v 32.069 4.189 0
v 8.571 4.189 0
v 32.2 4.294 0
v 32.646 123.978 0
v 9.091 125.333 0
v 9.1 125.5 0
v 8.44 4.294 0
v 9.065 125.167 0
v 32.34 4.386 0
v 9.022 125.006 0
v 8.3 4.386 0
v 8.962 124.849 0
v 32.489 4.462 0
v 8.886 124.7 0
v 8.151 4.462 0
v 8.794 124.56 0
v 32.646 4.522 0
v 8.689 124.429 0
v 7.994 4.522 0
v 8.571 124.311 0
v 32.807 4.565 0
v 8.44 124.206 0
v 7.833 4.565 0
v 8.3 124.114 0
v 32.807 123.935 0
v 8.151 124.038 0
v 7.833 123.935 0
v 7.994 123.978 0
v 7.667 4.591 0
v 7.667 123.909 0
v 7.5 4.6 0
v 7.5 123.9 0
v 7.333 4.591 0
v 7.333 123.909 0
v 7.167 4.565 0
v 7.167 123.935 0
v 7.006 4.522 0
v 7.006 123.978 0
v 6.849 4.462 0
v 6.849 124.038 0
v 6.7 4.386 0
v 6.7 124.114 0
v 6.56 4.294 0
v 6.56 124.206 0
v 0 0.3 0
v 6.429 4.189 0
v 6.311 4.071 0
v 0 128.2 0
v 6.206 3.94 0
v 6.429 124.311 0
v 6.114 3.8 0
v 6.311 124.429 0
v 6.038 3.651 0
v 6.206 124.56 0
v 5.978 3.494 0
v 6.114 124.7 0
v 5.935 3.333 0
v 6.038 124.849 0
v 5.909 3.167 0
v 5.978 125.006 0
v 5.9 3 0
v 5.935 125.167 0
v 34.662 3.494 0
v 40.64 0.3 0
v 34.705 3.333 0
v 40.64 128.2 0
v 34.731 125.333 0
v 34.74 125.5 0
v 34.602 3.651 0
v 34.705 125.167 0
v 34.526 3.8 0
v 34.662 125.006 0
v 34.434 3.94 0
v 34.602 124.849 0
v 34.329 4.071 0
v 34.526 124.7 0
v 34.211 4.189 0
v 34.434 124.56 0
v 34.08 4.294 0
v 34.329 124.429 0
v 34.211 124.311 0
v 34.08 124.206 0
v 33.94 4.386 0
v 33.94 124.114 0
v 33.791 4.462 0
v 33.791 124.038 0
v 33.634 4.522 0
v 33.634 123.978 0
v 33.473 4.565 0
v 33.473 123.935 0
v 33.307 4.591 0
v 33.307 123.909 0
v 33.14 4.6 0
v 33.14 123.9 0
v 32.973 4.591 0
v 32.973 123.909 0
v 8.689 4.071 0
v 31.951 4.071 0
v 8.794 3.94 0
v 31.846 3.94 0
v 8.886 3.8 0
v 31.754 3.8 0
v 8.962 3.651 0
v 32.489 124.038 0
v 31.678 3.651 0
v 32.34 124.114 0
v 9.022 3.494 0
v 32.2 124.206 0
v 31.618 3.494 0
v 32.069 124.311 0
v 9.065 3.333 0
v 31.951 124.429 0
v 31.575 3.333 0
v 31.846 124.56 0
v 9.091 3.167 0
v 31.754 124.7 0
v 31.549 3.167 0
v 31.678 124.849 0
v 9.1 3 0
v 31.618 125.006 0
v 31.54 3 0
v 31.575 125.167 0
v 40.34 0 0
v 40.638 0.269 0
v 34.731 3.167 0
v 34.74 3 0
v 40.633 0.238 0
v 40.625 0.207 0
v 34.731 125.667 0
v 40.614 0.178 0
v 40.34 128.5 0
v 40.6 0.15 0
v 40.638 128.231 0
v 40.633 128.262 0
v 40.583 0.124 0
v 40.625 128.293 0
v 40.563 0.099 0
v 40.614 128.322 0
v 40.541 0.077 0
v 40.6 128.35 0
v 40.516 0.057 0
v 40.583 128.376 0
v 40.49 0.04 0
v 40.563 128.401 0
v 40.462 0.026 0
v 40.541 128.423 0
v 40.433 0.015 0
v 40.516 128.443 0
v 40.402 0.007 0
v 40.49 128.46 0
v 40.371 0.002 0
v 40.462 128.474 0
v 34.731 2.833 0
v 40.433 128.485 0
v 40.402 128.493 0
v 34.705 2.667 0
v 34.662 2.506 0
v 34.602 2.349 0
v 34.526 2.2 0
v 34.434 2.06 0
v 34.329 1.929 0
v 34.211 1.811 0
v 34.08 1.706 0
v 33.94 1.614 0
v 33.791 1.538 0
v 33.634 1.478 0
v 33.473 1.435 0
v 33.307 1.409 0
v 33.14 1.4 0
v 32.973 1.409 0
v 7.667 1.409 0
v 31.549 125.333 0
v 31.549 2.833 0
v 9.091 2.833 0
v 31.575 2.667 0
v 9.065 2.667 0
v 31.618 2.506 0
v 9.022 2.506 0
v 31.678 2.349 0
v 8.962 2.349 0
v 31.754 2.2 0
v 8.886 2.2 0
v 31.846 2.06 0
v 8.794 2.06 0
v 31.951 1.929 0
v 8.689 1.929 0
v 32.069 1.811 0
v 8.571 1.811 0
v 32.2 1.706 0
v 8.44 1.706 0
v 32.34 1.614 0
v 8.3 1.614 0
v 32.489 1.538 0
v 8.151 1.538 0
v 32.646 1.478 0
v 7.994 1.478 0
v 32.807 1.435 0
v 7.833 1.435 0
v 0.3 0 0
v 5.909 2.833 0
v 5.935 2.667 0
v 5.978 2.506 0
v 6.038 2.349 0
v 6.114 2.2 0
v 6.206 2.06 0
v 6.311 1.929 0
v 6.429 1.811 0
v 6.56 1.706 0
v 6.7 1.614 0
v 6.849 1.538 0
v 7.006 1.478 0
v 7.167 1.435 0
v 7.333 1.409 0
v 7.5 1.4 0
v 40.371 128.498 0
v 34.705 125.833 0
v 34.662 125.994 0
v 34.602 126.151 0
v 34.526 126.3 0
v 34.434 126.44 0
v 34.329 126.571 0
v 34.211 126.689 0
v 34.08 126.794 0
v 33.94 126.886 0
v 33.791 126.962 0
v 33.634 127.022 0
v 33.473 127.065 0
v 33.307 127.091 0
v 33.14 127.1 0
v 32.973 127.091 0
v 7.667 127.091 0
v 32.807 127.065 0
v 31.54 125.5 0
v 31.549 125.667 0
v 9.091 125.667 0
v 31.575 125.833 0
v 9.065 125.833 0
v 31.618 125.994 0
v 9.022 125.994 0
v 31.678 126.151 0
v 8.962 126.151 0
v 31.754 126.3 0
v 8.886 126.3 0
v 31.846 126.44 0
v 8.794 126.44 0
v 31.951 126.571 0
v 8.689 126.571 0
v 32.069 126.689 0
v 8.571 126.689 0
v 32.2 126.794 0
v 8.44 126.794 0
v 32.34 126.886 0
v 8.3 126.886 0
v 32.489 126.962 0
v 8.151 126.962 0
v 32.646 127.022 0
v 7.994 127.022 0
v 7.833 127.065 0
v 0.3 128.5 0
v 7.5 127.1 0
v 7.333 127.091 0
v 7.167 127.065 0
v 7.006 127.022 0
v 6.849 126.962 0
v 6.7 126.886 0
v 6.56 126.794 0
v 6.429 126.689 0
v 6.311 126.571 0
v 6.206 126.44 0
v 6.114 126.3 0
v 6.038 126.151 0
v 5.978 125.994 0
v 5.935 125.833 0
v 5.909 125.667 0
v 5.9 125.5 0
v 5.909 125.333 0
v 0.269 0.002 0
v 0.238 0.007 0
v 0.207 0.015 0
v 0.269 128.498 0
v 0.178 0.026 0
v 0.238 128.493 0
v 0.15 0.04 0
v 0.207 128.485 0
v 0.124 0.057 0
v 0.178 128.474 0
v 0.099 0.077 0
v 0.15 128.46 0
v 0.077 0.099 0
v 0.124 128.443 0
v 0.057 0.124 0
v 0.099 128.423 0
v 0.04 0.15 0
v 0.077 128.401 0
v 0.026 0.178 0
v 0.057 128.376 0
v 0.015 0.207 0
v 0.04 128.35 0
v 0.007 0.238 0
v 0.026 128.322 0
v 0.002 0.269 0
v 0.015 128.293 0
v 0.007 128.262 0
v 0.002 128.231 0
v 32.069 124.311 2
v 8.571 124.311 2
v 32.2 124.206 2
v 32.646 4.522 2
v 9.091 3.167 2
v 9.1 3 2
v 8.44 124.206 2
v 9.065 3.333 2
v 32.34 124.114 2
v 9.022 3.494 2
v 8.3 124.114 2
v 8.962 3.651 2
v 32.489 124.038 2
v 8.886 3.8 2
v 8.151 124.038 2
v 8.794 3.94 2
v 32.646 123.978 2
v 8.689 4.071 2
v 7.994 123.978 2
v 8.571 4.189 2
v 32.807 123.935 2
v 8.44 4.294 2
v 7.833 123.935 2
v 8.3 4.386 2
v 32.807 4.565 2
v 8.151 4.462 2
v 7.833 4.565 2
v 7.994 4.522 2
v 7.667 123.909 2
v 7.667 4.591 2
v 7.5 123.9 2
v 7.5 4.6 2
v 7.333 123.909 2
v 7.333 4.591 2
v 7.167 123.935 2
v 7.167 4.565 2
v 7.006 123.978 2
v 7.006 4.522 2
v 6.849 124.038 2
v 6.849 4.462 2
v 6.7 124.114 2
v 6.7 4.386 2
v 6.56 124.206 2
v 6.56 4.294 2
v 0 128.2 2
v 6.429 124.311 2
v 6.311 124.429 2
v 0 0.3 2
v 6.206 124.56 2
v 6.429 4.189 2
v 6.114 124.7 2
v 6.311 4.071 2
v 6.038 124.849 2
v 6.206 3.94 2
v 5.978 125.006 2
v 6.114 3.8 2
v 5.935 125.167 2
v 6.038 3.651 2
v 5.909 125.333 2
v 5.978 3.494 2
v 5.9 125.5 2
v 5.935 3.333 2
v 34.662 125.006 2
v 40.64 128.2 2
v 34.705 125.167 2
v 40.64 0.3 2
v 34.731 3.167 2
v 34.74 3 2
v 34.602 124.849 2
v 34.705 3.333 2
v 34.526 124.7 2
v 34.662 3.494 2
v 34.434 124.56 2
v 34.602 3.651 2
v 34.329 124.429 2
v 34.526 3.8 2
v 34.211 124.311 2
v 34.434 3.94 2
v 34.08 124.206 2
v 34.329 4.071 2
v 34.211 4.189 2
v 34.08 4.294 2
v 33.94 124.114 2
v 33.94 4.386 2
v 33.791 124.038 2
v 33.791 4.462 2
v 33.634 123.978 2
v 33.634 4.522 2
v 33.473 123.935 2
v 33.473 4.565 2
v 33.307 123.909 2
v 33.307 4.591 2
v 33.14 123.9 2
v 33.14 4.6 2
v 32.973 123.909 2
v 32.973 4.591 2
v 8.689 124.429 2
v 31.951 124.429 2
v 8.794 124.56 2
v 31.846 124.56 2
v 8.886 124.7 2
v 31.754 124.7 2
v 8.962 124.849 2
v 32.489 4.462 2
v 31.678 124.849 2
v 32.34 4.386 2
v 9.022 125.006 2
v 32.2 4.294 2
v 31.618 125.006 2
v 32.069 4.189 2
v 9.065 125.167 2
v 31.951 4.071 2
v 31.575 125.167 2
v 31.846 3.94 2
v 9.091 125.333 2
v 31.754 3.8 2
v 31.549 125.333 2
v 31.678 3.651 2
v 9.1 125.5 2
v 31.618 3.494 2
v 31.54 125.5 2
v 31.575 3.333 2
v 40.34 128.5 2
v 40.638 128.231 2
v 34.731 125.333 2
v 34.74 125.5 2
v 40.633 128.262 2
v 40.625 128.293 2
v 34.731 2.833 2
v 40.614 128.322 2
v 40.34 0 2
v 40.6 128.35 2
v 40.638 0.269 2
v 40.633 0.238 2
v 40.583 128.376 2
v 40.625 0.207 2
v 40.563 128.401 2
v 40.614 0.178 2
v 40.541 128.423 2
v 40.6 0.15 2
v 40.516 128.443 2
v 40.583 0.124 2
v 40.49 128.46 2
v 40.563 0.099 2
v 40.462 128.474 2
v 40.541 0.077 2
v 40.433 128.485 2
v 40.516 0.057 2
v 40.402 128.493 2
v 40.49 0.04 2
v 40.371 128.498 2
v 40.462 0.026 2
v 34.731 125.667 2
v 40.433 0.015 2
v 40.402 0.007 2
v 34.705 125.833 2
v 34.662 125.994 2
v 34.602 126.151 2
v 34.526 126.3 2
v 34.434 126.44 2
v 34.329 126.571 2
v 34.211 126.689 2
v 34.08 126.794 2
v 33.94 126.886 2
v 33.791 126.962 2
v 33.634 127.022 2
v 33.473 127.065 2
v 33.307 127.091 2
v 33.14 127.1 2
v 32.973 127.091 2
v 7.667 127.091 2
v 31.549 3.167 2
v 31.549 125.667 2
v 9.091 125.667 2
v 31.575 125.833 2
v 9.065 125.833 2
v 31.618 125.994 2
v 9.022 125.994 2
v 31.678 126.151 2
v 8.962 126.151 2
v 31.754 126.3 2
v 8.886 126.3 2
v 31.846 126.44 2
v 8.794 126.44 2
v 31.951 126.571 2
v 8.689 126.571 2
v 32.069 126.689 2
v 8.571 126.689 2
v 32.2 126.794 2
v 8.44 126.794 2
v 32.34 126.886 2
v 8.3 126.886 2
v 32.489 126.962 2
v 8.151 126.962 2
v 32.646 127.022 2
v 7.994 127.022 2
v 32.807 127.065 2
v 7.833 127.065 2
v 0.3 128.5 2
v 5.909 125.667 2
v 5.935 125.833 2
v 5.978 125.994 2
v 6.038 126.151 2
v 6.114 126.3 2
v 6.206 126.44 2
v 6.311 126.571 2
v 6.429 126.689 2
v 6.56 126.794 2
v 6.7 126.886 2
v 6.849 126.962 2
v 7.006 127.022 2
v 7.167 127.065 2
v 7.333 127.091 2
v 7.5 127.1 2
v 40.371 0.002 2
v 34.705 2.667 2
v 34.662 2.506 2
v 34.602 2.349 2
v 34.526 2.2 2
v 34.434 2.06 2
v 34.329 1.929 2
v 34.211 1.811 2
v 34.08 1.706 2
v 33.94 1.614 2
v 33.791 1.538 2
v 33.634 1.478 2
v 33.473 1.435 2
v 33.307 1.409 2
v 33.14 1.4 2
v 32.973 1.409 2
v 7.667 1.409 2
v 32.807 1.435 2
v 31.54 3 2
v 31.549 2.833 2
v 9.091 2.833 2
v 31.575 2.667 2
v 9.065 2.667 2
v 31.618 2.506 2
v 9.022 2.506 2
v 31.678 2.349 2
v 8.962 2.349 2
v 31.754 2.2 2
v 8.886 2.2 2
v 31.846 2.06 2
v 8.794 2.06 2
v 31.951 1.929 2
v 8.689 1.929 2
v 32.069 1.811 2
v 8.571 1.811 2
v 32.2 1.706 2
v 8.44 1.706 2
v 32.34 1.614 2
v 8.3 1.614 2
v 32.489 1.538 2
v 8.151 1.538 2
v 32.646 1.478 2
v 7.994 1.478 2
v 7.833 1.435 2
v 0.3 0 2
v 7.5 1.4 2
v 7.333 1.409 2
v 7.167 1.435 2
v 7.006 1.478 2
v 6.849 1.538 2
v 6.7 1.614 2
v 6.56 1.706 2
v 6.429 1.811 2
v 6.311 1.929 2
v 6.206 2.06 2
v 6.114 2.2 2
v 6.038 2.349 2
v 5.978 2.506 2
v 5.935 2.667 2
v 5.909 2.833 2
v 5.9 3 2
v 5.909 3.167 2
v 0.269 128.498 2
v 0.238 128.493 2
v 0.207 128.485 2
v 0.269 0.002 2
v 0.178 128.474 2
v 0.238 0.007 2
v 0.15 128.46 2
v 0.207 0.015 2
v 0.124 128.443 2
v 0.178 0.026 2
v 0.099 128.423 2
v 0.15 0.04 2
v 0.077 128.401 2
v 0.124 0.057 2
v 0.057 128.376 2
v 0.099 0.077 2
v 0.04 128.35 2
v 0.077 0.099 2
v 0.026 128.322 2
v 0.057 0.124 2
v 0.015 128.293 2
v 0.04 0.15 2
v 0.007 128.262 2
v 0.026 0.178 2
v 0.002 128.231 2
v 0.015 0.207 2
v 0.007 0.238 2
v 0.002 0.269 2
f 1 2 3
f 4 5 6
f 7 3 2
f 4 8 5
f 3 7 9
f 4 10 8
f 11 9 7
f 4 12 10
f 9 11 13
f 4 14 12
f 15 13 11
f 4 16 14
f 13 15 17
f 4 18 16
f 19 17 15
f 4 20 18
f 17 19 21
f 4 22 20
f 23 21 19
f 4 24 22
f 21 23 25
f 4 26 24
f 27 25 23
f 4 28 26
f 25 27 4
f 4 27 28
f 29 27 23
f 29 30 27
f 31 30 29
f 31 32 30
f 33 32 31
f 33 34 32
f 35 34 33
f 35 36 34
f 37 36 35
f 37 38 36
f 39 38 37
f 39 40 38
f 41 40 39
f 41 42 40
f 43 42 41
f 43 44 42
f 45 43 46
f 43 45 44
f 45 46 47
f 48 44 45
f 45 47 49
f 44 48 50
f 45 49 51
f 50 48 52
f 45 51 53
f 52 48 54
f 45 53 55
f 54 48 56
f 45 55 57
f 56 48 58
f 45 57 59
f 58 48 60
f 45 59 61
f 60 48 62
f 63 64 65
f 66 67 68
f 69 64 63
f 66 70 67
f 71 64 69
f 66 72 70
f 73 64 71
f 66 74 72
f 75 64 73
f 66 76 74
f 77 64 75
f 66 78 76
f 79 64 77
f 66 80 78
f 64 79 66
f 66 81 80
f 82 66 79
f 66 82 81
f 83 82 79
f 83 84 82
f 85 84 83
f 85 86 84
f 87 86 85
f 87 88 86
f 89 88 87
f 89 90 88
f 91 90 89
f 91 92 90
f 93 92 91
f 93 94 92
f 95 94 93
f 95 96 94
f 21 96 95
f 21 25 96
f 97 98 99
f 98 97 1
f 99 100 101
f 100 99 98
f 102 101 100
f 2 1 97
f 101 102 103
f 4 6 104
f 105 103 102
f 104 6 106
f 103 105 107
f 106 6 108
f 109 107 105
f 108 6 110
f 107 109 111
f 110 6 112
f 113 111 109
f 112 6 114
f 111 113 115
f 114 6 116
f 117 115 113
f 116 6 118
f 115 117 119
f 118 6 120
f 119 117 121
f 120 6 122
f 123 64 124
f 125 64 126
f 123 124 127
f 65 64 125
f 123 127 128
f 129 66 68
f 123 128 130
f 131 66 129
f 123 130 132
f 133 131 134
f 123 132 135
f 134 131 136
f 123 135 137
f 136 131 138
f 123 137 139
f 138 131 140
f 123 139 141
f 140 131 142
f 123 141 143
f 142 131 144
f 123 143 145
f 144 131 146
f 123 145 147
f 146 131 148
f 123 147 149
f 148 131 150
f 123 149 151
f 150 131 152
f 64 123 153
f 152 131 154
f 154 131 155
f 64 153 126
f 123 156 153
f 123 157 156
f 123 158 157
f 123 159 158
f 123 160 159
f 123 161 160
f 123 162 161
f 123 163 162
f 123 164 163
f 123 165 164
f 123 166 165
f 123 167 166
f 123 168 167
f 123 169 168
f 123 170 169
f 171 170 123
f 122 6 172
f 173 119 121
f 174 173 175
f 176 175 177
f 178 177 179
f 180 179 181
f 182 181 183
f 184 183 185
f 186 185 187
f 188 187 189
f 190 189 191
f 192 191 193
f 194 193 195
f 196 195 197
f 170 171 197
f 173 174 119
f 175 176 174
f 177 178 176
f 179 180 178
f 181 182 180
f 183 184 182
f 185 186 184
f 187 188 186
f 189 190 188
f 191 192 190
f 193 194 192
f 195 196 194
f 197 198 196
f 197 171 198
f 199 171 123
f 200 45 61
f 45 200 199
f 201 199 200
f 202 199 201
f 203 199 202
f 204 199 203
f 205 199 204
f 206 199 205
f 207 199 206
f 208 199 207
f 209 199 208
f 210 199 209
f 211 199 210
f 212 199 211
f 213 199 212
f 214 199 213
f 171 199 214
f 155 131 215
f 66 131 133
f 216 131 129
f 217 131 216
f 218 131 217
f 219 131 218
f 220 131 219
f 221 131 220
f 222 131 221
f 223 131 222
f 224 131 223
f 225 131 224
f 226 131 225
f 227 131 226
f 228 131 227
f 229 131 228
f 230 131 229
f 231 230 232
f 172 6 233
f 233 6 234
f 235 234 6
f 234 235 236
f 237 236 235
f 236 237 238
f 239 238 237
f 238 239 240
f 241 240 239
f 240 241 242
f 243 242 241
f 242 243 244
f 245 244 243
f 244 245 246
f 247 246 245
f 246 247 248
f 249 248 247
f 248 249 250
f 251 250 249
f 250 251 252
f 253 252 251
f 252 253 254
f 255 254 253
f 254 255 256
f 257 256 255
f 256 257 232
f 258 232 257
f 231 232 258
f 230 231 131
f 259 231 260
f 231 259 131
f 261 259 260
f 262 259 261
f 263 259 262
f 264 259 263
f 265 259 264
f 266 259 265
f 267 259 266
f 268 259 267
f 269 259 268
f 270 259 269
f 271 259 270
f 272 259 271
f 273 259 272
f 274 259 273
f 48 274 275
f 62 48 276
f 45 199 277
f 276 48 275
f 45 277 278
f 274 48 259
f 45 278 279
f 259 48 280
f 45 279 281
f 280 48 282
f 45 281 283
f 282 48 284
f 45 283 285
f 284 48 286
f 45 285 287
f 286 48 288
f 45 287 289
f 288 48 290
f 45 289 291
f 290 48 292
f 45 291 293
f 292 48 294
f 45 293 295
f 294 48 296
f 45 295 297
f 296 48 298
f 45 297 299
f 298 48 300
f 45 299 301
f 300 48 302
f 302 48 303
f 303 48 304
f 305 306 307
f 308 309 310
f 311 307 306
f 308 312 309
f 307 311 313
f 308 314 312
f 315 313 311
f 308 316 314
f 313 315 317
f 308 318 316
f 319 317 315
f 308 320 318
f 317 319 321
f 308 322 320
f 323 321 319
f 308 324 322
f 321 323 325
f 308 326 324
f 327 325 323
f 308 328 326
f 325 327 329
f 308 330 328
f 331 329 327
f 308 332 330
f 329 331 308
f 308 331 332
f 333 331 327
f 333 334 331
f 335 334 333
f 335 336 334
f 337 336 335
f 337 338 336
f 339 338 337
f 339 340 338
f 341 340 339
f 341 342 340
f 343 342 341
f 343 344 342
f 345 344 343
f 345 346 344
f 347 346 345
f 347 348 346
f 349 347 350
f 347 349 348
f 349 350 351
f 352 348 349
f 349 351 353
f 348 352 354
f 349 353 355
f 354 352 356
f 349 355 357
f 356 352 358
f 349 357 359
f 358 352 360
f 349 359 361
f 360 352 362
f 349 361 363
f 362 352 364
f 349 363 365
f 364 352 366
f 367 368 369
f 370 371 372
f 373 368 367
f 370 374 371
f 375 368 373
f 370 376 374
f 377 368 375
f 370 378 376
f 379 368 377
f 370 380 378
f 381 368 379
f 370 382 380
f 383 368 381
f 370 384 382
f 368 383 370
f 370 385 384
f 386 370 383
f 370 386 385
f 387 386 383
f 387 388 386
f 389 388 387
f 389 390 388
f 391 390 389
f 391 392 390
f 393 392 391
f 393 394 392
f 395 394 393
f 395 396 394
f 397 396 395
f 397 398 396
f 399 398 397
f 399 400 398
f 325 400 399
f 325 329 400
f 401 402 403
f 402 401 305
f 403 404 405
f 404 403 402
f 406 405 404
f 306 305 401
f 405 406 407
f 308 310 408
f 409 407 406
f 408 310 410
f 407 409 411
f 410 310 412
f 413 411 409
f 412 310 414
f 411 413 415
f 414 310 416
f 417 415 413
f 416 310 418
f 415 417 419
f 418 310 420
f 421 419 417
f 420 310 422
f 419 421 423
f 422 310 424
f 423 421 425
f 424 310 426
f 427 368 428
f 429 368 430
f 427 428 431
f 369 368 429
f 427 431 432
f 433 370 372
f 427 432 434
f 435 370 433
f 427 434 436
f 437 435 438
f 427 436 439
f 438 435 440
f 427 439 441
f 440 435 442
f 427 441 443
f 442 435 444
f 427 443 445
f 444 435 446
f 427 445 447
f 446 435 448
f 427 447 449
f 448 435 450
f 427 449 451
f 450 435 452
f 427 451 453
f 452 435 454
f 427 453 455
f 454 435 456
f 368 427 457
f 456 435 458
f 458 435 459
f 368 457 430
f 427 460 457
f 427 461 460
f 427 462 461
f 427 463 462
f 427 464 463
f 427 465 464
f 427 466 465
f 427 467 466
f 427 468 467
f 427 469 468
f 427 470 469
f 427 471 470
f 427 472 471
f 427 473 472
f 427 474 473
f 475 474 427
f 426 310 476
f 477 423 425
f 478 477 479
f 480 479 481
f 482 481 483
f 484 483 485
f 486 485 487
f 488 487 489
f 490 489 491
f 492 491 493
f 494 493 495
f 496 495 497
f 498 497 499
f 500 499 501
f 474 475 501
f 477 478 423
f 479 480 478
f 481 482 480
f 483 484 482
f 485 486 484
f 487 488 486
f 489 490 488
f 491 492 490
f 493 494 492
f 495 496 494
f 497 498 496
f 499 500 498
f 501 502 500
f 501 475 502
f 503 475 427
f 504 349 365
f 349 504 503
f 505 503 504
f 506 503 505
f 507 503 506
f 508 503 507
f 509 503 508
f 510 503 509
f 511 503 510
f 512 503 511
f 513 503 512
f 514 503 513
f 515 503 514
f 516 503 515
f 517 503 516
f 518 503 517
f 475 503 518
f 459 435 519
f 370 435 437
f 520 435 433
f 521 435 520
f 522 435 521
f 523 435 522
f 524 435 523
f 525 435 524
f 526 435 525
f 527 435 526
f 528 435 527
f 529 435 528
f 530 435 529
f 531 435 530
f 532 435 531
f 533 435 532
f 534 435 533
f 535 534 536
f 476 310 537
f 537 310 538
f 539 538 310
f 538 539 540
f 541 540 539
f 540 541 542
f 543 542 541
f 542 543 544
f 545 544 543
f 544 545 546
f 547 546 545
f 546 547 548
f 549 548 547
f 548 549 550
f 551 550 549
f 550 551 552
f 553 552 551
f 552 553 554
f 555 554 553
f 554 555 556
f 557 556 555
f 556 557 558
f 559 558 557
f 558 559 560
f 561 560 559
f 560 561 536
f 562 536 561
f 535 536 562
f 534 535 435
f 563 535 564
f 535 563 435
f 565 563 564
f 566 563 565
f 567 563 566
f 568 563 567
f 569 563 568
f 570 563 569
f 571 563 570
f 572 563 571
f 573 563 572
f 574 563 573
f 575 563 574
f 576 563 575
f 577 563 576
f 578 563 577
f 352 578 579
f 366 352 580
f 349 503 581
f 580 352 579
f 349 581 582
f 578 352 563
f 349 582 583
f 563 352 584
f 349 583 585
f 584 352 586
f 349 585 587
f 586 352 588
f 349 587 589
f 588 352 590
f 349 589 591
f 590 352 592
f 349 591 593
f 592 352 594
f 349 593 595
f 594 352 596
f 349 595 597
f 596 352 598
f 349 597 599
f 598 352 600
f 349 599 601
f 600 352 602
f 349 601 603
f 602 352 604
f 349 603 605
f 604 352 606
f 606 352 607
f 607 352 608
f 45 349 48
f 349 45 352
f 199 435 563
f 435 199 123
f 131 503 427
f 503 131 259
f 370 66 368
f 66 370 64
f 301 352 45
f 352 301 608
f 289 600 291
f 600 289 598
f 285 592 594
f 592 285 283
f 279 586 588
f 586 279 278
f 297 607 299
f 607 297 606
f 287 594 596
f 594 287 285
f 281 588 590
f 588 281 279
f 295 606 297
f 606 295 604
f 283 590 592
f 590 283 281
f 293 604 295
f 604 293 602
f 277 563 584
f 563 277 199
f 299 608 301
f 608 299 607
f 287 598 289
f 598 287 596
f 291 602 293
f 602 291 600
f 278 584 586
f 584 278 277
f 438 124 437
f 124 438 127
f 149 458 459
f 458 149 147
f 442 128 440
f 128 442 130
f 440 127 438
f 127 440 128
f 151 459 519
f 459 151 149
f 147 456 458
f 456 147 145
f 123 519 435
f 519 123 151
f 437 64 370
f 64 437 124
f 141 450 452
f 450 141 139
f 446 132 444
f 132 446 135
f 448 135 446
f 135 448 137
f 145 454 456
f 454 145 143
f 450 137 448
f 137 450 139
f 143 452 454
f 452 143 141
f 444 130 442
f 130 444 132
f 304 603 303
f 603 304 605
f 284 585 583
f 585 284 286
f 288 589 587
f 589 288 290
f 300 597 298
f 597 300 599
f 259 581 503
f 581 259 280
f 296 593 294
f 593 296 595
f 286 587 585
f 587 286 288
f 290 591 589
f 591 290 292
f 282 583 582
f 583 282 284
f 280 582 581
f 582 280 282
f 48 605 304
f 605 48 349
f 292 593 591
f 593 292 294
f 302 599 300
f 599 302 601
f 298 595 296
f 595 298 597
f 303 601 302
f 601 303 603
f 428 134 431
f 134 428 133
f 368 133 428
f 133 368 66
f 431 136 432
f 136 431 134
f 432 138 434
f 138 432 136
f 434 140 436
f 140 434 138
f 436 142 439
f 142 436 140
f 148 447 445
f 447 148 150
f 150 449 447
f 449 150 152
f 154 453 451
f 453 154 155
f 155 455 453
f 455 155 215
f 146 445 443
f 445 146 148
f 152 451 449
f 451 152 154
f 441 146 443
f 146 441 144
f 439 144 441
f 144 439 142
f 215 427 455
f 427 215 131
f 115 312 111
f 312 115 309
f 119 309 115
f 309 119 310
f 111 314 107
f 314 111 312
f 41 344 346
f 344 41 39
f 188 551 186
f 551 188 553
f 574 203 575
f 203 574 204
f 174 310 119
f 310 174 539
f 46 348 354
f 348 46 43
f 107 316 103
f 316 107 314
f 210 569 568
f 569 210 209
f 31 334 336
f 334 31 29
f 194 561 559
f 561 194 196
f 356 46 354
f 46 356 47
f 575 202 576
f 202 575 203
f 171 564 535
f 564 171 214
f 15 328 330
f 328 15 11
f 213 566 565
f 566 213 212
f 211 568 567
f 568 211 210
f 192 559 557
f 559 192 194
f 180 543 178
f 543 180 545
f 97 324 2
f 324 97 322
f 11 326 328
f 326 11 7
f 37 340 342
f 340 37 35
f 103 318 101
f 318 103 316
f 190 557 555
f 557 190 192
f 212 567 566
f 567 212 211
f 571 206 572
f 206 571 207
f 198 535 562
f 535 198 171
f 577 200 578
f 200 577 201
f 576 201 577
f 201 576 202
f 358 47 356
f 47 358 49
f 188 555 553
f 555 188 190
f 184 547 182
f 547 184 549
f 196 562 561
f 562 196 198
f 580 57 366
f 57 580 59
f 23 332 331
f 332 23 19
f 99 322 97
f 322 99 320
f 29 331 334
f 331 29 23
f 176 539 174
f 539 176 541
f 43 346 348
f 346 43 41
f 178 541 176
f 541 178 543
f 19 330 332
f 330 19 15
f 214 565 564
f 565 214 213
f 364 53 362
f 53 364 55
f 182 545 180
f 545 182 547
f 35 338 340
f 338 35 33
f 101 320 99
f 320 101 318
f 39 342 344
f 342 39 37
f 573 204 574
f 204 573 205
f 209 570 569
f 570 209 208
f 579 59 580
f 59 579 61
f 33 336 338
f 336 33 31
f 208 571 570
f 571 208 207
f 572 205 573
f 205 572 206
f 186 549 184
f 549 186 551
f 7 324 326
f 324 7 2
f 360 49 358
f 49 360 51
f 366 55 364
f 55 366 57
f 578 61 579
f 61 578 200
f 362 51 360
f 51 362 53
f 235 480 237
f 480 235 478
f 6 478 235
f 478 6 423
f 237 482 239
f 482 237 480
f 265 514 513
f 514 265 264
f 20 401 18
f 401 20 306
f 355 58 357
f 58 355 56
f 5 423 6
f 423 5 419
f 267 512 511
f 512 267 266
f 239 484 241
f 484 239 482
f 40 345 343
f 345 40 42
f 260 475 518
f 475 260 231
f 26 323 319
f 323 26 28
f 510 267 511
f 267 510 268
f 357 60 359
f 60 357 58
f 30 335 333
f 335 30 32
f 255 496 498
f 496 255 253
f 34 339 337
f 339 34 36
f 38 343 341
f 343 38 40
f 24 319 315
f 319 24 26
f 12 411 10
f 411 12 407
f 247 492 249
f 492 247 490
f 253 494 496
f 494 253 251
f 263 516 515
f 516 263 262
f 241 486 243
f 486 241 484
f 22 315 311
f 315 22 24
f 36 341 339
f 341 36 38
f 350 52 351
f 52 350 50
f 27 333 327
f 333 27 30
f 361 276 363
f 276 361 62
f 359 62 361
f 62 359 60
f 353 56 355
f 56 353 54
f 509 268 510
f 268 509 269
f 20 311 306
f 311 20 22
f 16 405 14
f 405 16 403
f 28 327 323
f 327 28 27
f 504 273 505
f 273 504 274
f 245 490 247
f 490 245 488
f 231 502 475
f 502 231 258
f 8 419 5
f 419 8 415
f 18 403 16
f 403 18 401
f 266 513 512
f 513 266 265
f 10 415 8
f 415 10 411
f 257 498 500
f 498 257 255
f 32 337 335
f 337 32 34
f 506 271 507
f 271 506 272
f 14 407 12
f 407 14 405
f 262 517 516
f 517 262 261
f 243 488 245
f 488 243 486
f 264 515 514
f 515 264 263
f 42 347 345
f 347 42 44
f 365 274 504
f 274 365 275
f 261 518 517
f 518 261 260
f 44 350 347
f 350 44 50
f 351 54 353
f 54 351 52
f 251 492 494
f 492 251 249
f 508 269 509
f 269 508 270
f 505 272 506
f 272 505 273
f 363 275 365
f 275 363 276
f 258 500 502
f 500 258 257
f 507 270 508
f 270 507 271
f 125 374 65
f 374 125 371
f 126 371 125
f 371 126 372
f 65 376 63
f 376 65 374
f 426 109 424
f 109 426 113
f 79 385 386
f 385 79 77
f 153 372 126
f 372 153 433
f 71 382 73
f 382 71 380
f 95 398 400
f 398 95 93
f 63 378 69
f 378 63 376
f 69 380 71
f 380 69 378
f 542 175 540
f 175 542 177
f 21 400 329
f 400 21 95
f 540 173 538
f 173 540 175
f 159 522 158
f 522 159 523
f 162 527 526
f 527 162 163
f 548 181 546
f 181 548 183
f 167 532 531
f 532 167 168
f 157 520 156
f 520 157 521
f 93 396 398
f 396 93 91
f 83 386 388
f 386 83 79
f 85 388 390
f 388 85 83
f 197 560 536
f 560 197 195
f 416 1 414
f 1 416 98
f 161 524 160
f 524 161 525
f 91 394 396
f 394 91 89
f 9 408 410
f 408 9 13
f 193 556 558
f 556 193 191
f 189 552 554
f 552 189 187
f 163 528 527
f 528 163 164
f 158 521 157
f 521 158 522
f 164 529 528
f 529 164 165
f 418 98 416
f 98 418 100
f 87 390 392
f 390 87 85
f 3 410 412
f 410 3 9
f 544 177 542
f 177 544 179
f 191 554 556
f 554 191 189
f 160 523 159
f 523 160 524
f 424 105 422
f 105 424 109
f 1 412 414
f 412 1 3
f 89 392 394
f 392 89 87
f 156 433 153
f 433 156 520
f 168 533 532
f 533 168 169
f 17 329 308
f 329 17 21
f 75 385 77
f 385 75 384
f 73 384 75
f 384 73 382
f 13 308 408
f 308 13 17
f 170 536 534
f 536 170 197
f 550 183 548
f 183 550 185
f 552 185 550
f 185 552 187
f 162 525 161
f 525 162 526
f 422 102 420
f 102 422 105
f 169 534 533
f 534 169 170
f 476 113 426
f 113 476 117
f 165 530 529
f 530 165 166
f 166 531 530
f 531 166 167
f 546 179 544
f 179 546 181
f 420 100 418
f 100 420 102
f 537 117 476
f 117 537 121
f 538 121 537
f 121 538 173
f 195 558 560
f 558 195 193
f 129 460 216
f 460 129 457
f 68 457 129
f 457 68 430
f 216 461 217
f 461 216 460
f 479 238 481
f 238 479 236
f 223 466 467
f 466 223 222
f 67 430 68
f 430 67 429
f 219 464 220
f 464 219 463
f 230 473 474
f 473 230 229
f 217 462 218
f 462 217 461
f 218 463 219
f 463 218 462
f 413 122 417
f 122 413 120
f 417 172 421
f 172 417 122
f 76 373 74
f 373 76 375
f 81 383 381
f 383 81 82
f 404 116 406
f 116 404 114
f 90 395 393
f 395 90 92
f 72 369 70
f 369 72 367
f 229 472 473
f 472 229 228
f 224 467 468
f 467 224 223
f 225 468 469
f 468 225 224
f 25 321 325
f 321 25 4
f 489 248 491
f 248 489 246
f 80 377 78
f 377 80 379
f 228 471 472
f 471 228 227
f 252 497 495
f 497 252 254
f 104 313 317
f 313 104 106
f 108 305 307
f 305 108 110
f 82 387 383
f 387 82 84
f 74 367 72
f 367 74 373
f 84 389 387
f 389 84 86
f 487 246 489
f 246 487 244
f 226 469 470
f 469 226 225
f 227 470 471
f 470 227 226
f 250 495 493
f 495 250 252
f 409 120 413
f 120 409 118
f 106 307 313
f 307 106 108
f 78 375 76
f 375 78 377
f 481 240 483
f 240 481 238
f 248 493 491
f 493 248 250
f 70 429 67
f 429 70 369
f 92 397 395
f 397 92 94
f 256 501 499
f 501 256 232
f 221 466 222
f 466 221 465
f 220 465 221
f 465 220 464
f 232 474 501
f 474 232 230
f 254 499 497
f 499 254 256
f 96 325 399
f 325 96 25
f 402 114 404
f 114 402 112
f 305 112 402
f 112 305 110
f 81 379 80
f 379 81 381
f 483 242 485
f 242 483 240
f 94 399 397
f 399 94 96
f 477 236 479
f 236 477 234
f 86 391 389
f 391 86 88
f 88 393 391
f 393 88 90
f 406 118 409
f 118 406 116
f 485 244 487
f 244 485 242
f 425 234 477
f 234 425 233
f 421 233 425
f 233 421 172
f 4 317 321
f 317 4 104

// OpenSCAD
// Copyright (c) 2019 Damien Miller
//
// Permission to use, copy, modify, and distribute this software for any
// purpose with or without fee is hereby granted, provided that the above
// copyright notice and this permission notice appear in all copies.
//
// THE SOFTWARE IS PROVIDED "AS IS" AND THE AUTHOR DISCLAIMS ALL WARRANTIES
// WITH REGARD TO THIS SOFTWARE INCLUDING ALL IMPLIED WARRANTIES OF
// MERCHANTABILITY AND FITNESS. IN NO EVENT SHALL THE AUTHOR BE LIABLE FOR
// ANY SPECIAL, DIRECT, INDIRECT, OR CONSEQUENTIAL DAMAGES OR ANY DAMAGES
// WHATSOEVER RESULTING FROM LOSS OF USE, DATA OR PROFITS, WHETHER IN AN
// ACTION OF CONTRACT, NEGLIGENCE OR OTHER TORTIOUS ACTION, ARISING OUT OF
// OR IN CONNECTION WITH THE USE OR PERFORMANCE OF THIS SOFTWARE.

// Parametric model for Eurorack front panels.

$fn=60;

// Generates cylinders at each corner of a cuboid for rounding via CSG.
module corner_rounds(x, y, z, r) {
	translate([r, r, 0]) cylinder(h=z, r=r, center=false);
	translate([x-r, r, 0]) cylinder(h=z, r=r, center=false);
	translate([r, y-r, 0]) cylinder(h=z, r=r, center=false);
	translate([x-r, y-r, 0]) cylinder(h=z, r=r, center=false);
}

// Generates a triangular prism at the origin of the specified dimensions.
module triprism(l, w, h) {
	points = [
		[ 0, 0, 0 ], [ l, 0, 0 ], [ l, w, 0 ],
		[ 0, 0, h ], [ l, 0, h ], [ l, w, h ],
	];
	faces = [
		[ 0, 1, 2 ],	// bottom
		[ 0, 3, 4, 1],	// front
		[ 1, 4, 5, 2 ],	// right
		[ 2, 5, 3, 0 ],	// left
		[ 5, 4, 3 ],	// top
	];
	polyhedron(points, faces, convexity=2);
}

// Generates triangular prism at the corners of a cuboid. Used to cut the
// square corners off so they can be replaced with corner_rounds()
module corner_cuts(x, y, z, r) {
	translate([0, r, 0]) rotate([0, 0, 270]) triprism(r, r, z);
	translate([r, y, 0]) rotate([0, 0, 180]) triprism(r, r, z);
	translate([x, y-r, 0]) rotate([0, 0, 90]) triprism(r, r, z);
	translate([x-r, 0, 0]) rotate([0, 0, 0]) triprism(r, r, z);
}

// Generates a cuboid with the X/Y corners rounded to the specified radius.
module rounded_flat(x, y, z, r) {
	union() {
		difference() {
			cube([x,y,z]);
			corner_cuts(x, y, z, r);
		}
		corner_rounds(x, y, z, r);
	}
}

// Generates a blank Eurorack panel of the specified HP width and with the
// requested corner rounding.
module eurorack_panel(hp = 8, hole_dia = 3.2, r = 0.3) {
	width = 5.08 * hp;
	height = 128.5;
	depth = 2;
	difference() {
		rounded_flat(width, height, depth, r);
		// cut screw holes.
		translate([7.5, 3.0, 0])
			cylinder(h=depth, r=hole_dia / 2, center=false);
		translate([7.5, 125.5, 0])
			cylinder(h=depth, r=hole_dia / 2, center=false);
		translate([width-7.5, 3.0, 0])
			cylinder(h=depth, r=hole_dia / 2, center=false);
		translate([width-7.5, 125.5, 0])
			cylinder(h=depth, r=hole_dia / 2, center=false);
	}
}

eurorack_panel();
